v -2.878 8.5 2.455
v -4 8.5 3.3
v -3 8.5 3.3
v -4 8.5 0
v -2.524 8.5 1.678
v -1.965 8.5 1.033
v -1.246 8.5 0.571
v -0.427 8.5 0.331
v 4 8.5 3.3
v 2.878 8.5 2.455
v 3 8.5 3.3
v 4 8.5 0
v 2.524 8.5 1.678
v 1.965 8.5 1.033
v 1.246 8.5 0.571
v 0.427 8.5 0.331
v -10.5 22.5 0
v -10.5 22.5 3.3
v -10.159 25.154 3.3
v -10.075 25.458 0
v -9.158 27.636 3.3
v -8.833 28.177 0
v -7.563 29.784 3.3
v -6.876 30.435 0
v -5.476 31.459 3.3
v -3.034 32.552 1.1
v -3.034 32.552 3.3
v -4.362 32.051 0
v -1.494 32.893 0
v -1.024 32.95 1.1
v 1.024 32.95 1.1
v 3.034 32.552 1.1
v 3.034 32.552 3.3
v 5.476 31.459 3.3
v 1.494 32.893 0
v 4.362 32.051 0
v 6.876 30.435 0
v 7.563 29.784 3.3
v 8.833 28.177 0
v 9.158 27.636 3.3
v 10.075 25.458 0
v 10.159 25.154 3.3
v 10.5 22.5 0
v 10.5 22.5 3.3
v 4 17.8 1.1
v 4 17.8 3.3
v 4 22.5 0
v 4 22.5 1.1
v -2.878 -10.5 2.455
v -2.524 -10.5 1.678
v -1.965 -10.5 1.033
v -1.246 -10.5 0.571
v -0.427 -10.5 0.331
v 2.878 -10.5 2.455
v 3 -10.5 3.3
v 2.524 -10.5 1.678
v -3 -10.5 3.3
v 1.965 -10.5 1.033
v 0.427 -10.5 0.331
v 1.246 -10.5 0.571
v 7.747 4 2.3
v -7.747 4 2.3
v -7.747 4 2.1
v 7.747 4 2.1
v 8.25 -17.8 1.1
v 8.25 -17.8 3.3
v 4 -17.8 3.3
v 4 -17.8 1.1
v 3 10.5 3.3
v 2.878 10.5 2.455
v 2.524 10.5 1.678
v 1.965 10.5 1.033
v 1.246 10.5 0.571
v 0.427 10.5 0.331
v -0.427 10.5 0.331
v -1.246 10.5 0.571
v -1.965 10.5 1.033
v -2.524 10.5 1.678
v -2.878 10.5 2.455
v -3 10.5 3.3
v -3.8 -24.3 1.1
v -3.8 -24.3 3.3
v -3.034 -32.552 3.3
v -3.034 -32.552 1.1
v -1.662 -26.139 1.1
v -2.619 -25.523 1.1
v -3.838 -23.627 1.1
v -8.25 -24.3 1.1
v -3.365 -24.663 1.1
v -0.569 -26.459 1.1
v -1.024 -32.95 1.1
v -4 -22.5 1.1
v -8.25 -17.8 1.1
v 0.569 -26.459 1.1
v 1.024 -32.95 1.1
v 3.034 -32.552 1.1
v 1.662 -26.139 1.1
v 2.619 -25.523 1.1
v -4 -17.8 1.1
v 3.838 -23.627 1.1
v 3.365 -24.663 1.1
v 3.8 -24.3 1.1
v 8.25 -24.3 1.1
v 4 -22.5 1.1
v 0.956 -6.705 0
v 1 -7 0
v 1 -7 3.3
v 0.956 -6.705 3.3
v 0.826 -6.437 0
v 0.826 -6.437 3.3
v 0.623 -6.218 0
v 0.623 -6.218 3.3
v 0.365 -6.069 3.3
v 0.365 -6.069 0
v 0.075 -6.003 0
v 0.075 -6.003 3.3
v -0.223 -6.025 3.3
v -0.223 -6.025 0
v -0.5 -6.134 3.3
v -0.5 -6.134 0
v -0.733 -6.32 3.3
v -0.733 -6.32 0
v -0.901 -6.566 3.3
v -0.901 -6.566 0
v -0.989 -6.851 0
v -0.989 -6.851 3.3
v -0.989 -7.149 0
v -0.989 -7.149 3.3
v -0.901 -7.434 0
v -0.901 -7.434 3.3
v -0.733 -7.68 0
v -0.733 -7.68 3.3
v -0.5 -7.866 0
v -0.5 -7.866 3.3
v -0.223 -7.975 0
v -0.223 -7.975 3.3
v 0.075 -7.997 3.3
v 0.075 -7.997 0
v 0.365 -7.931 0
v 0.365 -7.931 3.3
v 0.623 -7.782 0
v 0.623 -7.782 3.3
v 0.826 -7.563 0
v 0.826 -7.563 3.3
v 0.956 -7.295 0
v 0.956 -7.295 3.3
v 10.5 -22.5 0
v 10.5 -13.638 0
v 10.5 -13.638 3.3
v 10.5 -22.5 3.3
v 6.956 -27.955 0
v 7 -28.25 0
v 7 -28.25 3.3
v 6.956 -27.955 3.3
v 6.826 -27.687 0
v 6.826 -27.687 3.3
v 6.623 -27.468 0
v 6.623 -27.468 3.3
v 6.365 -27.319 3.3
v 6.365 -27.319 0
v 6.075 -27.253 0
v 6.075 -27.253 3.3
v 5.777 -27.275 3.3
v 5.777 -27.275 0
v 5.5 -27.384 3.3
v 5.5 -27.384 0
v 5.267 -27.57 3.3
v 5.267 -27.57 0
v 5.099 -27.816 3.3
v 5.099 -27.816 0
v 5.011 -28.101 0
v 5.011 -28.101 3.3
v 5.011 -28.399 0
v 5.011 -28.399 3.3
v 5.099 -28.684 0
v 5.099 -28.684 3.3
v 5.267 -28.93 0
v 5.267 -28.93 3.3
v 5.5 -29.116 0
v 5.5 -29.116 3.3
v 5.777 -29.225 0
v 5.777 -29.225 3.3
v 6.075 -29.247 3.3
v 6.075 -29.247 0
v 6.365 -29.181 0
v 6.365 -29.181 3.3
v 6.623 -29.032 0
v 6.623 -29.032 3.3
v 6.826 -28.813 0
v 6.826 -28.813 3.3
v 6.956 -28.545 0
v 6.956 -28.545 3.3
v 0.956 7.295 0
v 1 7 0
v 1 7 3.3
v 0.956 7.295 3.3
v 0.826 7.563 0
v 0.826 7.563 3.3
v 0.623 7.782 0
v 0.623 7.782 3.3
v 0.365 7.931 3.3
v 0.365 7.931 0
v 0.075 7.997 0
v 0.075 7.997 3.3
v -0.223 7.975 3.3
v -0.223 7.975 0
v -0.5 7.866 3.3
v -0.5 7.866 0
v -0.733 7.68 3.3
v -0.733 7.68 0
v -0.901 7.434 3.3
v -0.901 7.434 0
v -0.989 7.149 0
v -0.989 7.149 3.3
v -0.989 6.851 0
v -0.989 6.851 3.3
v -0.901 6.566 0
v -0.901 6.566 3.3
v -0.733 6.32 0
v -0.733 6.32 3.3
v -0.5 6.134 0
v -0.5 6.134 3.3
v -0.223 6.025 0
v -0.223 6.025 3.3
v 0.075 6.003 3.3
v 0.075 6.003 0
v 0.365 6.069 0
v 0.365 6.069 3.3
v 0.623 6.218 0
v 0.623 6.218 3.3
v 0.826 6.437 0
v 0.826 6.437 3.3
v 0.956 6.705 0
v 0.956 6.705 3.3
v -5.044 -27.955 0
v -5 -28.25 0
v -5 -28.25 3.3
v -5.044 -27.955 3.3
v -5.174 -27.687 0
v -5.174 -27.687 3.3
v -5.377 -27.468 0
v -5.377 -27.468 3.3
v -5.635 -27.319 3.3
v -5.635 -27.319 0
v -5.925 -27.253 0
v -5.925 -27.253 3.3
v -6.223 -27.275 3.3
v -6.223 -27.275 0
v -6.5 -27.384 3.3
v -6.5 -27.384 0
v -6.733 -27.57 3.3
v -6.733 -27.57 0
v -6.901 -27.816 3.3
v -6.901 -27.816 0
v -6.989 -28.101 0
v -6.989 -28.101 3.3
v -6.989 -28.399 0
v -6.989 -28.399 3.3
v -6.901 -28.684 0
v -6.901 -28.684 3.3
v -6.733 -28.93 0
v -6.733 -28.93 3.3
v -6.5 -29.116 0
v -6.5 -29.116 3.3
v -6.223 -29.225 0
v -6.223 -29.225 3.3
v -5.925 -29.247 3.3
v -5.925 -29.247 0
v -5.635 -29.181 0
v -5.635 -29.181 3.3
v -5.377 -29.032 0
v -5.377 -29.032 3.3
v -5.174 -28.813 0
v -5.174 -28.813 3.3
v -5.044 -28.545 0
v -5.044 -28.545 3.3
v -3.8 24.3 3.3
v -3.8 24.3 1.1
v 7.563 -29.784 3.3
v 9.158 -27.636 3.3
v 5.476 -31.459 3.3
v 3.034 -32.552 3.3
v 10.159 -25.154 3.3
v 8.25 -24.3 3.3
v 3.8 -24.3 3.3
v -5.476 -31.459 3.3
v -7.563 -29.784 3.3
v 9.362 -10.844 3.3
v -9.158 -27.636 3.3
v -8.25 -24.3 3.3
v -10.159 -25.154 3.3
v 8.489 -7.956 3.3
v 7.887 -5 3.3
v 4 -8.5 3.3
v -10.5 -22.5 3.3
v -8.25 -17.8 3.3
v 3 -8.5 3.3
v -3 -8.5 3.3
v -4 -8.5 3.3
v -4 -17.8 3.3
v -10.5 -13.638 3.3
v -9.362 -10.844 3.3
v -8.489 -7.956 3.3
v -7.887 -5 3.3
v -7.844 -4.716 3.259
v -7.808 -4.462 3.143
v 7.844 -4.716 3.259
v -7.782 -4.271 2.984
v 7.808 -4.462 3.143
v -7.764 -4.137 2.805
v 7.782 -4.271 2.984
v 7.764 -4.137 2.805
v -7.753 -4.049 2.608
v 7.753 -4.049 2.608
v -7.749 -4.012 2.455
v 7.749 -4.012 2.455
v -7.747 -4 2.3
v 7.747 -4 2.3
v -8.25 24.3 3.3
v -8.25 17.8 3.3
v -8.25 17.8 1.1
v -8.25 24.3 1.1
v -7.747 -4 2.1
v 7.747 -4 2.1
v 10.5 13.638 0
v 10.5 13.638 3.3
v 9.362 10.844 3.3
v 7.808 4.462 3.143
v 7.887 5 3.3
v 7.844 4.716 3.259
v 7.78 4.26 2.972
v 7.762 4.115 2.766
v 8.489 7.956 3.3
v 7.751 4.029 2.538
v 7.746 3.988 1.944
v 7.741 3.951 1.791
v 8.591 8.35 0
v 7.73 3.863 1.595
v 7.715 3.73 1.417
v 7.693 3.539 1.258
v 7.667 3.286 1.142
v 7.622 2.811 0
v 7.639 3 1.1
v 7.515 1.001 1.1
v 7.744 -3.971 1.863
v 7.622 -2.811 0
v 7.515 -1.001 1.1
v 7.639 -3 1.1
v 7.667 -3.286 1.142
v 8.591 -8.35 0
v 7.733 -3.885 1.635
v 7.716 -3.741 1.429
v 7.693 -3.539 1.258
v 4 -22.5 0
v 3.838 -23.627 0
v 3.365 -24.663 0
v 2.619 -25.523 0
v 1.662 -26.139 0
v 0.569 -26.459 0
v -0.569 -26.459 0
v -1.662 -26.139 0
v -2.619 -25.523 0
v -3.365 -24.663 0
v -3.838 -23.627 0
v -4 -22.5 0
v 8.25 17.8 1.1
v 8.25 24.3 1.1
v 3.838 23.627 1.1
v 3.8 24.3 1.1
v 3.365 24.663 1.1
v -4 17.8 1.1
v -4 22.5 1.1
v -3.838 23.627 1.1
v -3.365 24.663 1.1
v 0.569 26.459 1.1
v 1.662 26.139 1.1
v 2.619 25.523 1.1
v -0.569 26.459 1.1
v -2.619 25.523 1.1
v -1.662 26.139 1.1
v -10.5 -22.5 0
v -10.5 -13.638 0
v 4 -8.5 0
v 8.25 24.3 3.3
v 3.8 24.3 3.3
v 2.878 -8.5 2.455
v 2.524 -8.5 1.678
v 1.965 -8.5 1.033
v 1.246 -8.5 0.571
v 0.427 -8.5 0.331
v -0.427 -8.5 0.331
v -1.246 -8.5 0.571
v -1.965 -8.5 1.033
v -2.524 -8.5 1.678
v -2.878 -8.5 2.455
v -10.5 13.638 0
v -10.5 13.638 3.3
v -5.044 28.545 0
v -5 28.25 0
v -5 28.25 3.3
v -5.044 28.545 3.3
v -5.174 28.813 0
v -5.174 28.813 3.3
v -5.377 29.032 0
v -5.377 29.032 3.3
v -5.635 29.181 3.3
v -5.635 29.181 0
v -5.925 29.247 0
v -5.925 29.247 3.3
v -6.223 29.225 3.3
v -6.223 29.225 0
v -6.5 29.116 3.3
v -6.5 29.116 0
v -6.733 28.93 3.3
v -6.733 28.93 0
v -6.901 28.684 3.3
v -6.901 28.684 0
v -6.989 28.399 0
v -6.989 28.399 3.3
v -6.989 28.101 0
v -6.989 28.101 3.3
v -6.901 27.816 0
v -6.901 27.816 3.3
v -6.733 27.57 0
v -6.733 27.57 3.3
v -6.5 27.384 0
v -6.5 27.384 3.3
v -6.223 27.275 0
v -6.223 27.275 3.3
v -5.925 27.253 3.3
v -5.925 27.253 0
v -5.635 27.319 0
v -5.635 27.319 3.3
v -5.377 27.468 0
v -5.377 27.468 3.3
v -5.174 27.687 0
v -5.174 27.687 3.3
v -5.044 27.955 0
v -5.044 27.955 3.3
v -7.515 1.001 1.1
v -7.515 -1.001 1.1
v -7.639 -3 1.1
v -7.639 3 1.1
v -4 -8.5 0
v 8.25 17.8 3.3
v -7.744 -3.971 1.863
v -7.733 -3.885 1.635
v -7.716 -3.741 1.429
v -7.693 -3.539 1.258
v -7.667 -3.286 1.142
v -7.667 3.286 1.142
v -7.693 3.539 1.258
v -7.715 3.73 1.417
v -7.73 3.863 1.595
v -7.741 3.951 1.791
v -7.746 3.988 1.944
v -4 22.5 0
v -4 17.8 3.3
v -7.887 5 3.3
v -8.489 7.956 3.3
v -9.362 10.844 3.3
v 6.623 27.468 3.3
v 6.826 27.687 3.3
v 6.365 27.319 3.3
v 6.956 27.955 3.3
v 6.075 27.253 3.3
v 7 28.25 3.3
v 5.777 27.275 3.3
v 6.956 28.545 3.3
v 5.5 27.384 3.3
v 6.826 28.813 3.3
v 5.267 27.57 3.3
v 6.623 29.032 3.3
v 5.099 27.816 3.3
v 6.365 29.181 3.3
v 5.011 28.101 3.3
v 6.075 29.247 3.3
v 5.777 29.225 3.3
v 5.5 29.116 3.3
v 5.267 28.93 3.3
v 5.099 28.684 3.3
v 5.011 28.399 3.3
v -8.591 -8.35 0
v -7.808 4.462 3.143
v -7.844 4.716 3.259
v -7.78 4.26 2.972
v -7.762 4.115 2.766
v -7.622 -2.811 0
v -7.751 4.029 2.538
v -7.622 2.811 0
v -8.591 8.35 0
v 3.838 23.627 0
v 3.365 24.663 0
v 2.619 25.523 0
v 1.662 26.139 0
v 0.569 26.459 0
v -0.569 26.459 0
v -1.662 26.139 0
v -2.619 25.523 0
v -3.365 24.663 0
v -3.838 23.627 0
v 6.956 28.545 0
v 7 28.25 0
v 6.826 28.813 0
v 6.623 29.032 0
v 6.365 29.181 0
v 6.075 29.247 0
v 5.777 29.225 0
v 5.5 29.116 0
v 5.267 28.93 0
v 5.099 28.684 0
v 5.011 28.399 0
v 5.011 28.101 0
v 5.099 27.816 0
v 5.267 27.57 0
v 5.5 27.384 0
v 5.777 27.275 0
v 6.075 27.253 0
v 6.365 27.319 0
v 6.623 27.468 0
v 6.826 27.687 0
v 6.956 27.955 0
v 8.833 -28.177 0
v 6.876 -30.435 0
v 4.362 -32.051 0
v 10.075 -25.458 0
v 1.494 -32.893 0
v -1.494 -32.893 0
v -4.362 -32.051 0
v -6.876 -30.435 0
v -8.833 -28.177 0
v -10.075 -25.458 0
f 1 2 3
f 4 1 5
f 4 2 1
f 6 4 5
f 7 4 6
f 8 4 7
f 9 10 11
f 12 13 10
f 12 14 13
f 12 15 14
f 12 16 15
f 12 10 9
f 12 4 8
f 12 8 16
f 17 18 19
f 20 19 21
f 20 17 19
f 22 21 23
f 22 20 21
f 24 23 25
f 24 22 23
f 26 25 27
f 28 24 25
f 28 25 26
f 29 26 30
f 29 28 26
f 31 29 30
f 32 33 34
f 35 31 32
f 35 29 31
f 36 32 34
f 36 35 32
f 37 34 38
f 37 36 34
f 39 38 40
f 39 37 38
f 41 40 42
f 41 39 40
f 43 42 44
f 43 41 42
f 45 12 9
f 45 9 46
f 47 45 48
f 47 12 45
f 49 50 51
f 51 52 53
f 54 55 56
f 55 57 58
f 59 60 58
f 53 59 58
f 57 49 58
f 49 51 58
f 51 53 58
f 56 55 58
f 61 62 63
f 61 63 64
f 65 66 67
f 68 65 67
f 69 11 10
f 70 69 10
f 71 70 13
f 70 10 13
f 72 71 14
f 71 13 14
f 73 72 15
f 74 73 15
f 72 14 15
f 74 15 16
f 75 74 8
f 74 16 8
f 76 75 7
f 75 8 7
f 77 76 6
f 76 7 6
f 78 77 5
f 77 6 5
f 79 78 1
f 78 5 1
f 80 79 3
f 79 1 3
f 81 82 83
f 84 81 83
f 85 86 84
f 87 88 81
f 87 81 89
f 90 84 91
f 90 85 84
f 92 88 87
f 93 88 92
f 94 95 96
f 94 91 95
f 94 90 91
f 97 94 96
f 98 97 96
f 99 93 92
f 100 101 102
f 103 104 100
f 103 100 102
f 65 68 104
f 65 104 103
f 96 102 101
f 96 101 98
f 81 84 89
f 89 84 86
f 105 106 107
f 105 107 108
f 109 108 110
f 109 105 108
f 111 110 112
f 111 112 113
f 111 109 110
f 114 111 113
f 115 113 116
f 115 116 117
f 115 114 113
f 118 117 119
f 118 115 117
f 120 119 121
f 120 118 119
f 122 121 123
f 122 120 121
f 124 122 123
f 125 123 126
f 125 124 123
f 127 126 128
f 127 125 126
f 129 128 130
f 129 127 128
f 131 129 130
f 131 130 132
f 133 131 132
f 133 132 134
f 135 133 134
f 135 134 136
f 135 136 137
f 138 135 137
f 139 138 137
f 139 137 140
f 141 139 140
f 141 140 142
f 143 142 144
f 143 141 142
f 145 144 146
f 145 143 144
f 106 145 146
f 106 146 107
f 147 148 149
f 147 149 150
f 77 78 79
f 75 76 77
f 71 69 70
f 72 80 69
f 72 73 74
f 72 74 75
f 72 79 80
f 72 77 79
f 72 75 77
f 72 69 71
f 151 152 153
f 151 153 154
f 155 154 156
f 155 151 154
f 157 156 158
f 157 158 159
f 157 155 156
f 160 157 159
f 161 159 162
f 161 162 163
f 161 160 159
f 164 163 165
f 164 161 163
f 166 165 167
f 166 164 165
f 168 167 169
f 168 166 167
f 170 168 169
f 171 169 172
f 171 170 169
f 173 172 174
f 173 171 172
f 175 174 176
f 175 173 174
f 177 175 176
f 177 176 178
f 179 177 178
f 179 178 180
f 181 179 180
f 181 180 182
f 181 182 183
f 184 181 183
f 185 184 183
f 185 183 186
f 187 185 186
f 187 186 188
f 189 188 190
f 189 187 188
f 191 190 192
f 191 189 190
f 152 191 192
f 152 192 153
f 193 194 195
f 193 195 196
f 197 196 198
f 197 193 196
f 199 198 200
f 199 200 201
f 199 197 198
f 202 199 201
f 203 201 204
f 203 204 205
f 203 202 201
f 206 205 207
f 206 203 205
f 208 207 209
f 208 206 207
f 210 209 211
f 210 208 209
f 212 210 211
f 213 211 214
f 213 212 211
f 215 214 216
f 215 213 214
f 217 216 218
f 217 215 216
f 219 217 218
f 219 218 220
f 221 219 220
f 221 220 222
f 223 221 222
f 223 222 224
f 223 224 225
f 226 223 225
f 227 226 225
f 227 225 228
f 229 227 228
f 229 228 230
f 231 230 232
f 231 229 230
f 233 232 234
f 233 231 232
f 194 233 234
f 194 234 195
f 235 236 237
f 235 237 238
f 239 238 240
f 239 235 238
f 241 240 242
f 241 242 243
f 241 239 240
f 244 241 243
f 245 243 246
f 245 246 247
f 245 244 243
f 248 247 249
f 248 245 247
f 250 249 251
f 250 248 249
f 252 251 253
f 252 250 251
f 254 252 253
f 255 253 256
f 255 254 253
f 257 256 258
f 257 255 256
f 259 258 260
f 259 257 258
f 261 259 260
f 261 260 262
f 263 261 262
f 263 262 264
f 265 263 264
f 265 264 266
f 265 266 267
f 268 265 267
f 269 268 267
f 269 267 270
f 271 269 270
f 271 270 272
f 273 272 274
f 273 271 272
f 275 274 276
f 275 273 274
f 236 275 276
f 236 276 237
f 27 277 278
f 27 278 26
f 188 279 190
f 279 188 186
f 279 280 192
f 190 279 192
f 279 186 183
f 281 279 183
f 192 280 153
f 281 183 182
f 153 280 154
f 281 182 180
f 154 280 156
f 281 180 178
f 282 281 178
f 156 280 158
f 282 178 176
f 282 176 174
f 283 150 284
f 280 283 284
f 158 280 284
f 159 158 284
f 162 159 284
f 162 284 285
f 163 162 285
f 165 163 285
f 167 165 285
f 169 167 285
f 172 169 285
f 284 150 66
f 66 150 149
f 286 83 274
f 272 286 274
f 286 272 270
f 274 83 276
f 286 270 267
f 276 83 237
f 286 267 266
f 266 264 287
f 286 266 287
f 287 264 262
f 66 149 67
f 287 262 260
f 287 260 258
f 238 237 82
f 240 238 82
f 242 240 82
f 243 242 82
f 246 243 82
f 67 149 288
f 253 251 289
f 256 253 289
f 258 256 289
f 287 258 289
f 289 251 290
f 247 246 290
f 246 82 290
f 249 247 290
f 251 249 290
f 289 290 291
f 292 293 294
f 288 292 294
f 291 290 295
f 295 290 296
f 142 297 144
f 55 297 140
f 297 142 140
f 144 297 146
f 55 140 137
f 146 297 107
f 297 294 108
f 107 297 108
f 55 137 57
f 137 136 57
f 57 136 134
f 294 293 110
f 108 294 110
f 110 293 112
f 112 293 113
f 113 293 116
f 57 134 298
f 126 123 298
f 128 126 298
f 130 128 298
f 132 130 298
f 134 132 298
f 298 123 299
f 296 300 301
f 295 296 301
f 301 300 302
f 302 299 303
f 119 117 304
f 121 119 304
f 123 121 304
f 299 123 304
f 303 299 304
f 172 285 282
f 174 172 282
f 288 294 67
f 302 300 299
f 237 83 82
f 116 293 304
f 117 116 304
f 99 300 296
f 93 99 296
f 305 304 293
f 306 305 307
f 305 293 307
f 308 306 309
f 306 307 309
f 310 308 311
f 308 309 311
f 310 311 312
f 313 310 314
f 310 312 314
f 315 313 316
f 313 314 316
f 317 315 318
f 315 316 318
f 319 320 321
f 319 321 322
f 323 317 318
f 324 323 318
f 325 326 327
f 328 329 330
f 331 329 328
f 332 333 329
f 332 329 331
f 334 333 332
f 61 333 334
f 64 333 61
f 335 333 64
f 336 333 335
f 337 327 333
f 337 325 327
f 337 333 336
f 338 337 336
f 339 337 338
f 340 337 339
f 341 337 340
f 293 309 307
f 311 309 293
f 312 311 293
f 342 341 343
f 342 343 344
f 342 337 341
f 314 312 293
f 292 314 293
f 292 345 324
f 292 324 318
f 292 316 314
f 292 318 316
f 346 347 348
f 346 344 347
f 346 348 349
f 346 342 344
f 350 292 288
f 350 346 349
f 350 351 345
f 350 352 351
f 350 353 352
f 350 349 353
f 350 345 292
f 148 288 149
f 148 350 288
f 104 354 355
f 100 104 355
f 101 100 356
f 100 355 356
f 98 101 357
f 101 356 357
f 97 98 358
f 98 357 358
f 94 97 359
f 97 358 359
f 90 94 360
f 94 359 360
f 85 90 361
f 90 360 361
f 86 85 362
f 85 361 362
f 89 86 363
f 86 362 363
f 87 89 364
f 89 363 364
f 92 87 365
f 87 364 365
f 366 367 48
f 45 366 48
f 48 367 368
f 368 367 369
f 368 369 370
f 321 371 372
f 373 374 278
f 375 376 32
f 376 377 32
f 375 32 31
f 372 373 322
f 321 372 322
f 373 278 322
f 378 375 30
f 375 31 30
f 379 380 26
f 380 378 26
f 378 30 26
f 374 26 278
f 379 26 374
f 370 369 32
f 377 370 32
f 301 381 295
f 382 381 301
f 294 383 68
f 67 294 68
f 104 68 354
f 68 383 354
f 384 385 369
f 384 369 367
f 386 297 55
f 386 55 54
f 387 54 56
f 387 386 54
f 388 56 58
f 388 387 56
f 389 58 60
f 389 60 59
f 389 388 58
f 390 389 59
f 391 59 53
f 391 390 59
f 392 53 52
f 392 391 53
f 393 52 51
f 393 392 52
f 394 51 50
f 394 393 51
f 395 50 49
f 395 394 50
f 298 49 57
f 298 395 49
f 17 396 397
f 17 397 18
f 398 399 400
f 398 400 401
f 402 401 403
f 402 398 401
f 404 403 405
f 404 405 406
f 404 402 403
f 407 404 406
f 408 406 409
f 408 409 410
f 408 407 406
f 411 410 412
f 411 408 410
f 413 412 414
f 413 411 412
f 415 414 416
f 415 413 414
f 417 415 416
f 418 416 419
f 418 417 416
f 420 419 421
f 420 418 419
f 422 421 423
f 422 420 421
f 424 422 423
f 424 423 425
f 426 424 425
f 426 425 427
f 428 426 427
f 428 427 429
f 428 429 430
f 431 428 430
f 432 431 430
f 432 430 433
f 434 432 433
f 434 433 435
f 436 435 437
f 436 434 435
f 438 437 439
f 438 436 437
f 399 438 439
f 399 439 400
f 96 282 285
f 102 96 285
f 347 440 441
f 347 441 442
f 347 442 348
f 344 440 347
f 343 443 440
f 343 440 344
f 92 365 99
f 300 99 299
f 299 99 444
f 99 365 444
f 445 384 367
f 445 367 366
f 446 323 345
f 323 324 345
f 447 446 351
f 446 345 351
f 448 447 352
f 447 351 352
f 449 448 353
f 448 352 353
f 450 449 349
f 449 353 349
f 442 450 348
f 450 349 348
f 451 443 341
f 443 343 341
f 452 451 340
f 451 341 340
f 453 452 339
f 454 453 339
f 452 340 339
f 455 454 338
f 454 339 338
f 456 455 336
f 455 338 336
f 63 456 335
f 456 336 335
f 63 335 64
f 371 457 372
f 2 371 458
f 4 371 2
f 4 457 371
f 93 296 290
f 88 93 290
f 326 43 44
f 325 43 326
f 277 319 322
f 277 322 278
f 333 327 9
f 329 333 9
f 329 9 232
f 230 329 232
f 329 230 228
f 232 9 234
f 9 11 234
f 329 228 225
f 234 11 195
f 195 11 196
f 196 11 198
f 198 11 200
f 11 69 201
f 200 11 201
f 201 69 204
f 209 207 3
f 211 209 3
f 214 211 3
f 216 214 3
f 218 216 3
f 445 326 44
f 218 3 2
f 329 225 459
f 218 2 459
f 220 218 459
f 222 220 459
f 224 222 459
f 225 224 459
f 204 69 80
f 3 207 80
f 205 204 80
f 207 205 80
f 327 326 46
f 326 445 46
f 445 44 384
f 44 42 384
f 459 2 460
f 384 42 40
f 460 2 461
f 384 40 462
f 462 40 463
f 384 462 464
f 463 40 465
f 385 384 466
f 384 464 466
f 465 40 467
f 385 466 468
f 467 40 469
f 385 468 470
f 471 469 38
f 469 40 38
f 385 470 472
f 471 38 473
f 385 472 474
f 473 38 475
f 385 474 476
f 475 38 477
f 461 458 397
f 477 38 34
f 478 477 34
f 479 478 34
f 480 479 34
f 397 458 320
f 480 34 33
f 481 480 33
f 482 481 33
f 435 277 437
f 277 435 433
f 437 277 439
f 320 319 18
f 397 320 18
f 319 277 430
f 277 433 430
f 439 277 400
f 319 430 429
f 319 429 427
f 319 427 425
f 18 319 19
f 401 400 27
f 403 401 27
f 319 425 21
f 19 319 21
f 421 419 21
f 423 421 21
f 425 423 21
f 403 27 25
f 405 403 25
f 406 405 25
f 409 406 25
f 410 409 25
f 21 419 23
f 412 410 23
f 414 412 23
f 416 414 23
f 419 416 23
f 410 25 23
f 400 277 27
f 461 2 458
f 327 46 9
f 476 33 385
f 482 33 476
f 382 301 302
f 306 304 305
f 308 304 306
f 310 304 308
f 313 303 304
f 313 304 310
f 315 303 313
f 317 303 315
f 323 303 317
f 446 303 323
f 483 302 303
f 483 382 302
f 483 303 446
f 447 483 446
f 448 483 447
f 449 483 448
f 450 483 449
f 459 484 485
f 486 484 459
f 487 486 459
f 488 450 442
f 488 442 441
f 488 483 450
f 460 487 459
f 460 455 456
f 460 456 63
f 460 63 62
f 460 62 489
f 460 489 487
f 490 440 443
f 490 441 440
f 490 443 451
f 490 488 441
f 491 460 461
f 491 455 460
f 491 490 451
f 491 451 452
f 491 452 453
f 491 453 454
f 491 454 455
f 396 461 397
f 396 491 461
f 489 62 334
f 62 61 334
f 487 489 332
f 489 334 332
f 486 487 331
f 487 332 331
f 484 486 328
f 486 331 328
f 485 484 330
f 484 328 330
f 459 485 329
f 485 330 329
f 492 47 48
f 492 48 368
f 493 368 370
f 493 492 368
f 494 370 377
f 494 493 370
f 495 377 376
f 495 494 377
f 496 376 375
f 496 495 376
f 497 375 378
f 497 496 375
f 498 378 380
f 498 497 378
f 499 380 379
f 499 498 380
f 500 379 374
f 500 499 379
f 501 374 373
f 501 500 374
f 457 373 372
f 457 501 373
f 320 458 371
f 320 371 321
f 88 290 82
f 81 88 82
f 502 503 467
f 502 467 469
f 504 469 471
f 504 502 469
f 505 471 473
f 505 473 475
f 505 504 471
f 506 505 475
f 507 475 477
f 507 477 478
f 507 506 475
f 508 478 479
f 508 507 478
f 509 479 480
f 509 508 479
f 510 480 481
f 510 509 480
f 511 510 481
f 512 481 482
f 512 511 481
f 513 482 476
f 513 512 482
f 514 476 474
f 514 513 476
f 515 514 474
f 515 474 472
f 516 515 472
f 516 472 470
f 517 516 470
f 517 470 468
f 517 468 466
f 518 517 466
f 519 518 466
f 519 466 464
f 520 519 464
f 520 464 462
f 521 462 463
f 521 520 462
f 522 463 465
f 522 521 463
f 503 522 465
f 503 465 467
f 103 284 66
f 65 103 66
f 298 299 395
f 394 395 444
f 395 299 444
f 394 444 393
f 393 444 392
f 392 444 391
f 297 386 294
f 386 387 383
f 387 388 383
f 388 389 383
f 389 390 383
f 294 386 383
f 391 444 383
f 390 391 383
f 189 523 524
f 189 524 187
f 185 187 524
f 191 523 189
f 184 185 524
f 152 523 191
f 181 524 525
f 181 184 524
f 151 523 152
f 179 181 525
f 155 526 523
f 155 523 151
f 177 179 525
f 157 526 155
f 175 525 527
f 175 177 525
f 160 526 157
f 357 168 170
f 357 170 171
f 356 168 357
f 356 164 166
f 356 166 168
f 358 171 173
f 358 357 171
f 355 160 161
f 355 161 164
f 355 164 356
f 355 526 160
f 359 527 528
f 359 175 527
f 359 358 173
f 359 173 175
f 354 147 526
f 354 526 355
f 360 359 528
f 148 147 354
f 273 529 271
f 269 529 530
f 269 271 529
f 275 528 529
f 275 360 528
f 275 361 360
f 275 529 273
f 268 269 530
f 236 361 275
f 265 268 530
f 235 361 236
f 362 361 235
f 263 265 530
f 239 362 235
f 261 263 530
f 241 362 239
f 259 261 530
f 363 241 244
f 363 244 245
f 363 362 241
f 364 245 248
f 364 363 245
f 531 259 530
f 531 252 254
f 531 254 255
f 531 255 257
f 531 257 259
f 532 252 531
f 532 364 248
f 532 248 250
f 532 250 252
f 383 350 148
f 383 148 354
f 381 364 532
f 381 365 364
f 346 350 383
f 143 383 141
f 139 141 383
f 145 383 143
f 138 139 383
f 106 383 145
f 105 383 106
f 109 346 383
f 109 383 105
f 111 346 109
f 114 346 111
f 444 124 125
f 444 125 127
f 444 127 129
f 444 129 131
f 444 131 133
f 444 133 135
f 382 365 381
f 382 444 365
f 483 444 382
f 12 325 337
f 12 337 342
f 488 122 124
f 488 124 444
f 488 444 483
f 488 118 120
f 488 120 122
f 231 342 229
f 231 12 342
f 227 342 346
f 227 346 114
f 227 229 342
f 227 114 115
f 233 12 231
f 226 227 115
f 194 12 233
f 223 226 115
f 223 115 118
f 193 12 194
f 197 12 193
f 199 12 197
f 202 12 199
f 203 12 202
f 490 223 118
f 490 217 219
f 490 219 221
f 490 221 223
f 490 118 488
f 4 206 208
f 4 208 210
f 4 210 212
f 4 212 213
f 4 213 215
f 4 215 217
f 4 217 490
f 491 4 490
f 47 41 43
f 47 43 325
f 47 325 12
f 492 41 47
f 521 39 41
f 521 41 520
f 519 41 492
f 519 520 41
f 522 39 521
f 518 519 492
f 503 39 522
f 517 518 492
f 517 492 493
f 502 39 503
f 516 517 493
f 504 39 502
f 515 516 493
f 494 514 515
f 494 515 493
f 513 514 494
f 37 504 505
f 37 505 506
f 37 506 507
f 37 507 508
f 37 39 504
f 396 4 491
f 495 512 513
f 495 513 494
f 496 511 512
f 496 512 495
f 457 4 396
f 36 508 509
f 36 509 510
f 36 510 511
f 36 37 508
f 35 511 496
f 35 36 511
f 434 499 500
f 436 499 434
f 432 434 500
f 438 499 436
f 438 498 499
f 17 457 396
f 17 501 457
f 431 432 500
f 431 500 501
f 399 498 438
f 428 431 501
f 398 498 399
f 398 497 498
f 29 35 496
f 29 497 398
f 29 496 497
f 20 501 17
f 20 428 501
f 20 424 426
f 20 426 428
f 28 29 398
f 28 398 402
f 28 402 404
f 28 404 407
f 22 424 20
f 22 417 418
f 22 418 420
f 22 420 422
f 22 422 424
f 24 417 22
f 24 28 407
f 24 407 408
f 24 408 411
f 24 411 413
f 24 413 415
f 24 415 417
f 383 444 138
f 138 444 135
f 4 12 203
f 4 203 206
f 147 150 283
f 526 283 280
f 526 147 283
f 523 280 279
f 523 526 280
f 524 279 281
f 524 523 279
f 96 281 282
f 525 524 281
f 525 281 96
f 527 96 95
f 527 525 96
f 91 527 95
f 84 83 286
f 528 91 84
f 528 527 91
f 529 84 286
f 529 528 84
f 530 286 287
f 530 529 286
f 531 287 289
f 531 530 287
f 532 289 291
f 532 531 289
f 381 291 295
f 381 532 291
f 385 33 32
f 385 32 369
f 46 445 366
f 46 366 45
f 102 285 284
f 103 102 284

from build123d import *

# Parameters (mm, degrees)
SKETCH_1_R          = 1
EXTRUDE_1_DEPTH     = 3.3
SKETCH_2_W          = 20
SKETCH_2_H          = 8
CUT_EXTRUDE_1_DEPTH = 2.2
FILLET_1_R          = 1
EXTRUDE_2_DEPTH     = 2


with BuildPart() as part:
    # 草图1 → 凸台-拉伸1 (new body)
    with BuildSketch(Plane.XY):
        with BuildLine():
            Line((10.5, -13.638181697), (10.5, -22.5))
            ThreePointArc((10.5, -22.5), (0, -33), (-10.5, -22.5))
            Line((-10.5, -22.5), (-10.5, -13.638181697))
            ThreePointArc((-10.5, -13.638181697), (-7.5, 0), (-10.5, 13.638181697))
            Line((-10.5, 13.638181697), (-10.5, 22.5))
            ThreePointArc((-10.5, 22.5), (0, 33), (10.5, 22.5))
            Line((10.5, 22.5), (10.5, 13.638181697))
            ThreePointArc((10.5, 13.638181697), (7.5, 0), (10.5, -13.638181697))
        make_face()
        with Locations((0, 7)):
            Circle(SKETCH_1_R, mode=Mode.SUBTRACT)
        with Locations((0, -7)):
            Circle(SKETCH_1_R, mode=Mode.SUBTRACT)
        with Locations((-6, 28.25)):
            Circle(SKETCH_1_R, mode=Mode.SUBTRACT)
        with Locations((6, 28.25)):
            Circle(SKETCH_1_R, mode=Mode.SUBTRACT)
        with Locations((6, -28.25)):
            Circle(SKETCH_1_R, mode=Mode.SUBTRACT)
        with Locations((-6, -28.25)):
            Circle(SKETCH_1_R, mode=Mode.SUBTRACT)
        with BuildLine():
            Line((-4, -22.499999544), (-4, -8.5))
            Line((-4, -8.5), (4, -8.5))
            Line((4, -8.5), (4, -22.500000456))
            ThreePointArc((4, -22.500000456), (-4.56e-07, -26.5), (-4, -22.499999544))
        make_face(mode=Mode.SUBTRACT)
        with BuildLine():
            Line((-4, 22.499999544), (-4, 8.5))
            Line((-4, 8.5), (4, 8.5))
            Line((4, 8.5), (4, 22.500000456))
            ThreePointArc((4, 22.500000456), (-4.56e-07, 26.5), (-4, 22.499999544))
        make_face(mode=Mode.SUBTRACT)
    extrude(amount=EXTRUDE_1_DEPTH)

    # 草图2 → 切除-拉伸1 (cut)
    with BuildSketch(Plane.XY.offset(3.3)):
        Polygon((-3.8, 24.3), (-2.871447866, 34.3), (2.871447866, 34.3), (3.8, 24.3), (8.25, 24.3), (8.25, 17.8), (-8.25, 17.8), (-8.25, 24.3), align=None)
        Rectangle(SKETCH_2_W, SKETCH_2_H)
        Polygon((3.8, -24.3), (8.25, -24.3), (8.25, -17.8), (-8.25, -17.8), (-8.25, -24.3), (-3.8, -24.3), (-2.871447866, -34.3), (2.871447866, -34.3), align=None)
    extrude(amount=-CUT_EXTRUDE_1_DEPTH, mode=Mode.SUBTRACT)

    # 圆角1
    fillet_1_edges = [part.edges().sort_by_distance(p)[0] for p in [
        (0, -4, 1.1),
        (0, 4, 1.1),
        (0, -4, 3.3),
        (0, 4, 3.3),
    ]]
    fillet(fillet_1_edges, radius=FILLET_1_R)

    # 草图3 → 凸台-拉伸2 (add)
    with BuildSketch(Plane(origin=(0, 8.5, 0), x_dir=(1, 0, 0), z_dir=(0, 1, 0))):
        with BuildLine():
            Line((-3, -3.3), (3, -3.3))
            ThreePointArc((3, -3.3), (0, -0.3), (-3, -3.3))
        make_face()
    extrude_2 = extrude(amount=EXTRUDE_2_DEPTH)

    # 镜向1: 凸台-拉伸2 across plane
    add(extrude_2.mirror(Plane.ZX))


solid = part.part
